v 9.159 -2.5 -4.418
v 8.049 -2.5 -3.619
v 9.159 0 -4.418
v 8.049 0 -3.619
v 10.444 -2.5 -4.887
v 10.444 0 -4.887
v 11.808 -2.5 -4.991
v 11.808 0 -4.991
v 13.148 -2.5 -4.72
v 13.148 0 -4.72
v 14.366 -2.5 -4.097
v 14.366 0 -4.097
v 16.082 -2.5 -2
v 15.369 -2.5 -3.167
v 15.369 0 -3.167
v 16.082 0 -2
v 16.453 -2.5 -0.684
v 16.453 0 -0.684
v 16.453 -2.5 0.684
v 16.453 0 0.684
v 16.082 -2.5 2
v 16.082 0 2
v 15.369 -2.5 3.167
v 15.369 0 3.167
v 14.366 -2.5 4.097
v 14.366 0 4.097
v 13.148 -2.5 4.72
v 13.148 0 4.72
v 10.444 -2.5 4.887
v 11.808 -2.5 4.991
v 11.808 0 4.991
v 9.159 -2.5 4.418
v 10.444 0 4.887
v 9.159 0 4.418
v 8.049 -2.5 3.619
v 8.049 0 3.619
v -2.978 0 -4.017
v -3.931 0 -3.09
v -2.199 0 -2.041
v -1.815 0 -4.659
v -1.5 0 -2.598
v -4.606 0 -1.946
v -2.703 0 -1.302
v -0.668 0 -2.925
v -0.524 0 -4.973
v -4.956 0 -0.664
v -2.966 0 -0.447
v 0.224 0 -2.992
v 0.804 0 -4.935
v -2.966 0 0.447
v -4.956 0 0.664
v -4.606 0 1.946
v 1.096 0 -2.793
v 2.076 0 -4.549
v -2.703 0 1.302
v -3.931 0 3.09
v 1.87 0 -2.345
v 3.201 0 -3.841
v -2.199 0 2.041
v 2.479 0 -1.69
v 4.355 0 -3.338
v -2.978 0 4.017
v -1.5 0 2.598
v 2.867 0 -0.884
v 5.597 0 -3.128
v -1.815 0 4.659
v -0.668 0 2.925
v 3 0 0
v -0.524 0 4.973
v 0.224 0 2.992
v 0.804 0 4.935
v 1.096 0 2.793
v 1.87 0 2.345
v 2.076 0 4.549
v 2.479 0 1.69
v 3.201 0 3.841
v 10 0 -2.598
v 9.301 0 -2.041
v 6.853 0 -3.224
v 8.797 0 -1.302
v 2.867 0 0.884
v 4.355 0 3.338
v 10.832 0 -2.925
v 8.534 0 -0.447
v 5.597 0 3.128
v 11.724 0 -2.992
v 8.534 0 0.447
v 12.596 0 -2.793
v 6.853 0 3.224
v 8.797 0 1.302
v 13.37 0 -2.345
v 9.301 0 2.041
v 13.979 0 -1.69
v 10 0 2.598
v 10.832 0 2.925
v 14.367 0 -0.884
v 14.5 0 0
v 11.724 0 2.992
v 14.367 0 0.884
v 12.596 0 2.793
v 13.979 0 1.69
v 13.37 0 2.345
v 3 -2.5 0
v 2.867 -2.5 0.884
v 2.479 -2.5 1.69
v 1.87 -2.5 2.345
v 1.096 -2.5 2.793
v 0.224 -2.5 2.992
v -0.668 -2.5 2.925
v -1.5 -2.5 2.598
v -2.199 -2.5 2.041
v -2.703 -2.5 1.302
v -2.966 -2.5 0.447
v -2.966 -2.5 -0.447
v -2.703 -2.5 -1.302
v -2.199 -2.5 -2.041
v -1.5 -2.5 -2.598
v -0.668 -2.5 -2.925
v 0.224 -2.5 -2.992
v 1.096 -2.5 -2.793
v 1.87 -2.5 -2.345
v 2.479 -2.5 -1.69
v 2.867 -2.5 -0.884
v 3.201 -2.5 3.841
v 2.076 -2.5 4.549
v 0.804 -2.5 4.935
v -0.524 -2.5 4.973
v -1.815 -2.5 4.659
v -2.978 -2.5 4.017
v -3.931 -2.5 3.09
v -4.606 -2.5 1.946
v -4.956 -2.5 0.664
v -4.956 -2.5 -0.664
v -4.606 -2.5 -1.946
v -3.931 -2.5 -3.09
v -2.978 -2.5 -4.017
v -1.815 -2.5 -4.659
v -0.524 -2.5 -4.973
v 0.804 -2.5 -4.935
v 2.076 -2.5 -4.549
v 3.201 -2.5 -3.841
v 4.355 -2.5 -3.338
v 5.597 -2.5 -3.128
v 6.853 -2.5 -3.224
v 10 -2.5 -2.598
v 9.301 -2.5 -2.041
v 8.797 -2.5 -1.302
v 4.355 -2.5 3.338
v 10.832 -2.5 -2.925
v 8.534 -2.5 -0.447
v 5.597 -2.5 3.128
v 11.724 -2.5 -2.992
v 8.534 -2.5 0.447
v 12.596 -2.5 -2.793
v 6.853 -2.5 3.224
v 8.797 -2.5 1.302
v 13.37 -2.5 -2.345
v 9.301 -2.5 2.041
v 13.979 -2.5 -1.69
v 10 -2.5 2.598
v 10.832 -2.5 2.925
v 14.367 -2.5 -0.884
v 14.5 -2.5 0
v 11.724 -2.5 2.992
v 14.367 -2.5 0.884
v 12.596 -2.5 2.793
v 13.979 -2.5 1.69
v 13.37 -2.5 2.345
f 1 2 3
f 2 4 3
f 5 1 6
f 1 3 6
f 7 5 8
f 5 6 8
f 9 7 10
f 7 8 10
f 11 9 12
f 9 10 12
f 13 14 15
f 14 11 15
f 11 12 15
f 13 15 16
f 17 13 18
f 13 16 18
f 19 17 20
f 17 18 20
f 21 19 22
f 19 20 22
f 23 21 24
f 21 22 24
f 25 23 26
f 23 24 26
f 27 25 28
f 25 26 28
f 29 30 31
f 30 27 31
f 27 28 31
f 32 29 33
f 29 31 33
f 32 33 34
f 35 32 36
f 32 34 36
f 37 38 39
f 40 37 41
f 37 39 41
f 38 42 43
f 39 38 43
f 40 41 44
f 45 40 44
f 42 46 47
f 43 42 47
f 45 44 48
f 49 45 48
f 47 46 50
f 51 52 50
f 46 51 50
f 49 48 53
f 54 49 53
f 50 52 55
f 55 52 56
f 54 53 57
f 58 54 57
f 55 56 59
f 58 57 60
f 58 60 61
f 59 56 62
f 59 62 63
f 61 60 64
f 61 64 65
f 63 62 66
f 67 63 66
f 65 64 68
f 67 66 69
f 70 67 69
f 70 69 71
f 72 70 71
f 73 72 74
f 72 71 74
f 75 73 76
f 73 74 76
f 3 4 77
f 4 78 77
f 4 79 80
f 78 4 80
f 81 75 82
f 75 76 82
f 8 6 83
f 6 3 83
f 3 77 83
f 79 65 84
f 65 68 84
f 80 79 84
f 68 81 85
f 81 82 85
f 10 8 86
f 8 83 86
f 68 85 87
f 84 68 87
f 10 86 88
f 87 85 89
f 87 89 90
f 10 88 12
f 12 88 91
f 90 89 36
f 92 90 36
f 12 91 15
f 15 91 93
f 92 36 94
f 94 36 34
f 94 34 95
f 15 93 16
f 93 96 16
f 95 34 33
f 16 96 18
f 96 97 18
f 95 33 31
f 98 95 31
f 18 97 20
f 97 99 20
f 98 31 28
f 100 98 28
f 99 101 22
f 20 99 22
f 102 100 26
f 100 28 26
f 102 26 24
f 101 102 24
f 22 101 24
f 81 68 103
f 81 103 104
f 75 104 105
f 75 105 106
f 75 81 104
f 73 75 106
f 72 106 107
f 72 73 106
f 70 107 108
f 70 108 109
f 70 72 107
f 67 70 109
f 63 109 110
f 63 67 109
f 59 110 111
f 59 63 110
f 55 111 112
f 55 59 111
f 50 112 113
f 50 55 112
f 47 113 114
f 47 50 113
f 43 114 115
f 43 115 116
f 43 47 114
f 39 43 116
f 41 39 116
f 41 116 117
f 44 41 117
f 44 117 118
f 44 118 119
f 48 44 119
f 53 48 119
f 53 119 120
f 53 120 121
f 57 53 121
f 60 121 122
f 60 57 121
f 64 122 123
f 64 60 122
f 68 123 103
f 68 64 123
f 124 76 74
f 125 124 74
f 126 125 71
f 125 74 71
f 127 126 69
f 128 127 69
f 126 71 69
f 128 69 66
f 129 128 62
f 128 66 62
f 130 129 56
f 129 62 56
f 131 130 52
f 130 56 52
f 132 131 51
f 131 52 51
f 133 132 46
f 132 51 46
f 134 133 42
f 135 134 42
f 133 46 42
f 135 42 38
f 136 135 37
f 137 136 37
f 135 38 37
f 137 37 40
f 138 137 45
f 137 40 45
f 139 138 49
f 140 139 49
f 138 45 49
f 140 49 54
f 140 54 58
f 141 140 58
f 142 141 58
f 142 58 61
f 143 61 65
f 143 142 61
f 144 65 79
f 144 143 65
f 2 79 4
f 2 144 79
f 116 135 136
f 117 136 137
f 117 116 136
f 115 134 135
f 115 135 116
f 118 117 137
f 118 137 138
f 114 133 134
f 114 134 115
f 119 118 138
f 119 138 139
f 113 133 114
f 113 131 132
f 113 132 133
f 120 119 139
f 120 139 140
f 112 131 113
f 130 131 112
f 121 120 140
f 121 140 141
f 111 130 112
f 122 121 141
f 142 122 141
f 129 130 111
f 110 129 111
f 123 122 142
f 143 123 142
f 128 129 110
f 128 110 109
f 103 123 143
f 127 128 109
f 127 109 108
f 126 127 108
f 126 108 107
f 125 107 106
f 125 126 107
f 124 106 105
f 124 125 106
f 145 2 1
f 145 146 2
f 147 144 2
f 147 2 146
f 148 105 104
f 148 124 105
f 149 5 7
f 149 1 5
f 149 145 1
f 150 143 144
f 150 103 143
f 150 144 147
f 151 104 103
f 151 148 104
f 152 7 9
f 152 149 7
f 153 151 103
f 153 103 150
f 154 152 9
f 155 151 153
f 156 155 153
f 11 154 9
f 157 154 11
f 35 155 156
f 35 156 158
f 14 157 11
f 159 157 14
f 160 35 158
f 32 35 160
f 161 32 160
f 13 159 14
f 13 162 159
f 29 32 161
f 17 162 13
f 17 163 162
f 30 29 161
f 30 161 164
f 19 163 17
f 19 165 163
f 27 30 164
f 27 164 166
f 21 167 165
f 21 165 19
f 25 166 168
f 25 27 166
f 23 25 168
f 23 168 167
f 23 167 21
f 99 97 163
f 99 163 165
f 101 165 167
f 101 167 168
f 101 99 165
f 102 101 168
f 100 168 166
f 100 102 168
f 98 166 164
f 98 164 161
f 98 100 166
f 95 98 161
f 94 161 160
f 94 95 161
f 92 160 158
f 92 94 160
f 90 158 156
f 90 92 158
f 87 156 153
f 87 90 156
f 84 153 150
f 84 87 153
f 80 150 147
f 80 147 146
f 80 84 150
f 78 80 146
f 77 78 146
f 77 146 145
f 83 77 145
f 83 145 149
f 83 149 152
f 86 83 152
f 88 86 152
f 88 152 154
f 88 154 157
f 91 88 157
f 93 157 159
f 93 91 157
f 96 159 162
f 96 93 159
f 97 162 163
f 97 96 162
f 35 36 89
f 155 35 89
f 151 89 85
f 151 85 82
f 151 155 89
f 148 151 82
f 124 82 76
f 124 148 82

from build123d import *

# Parameters (mm, degrees)
F0_R     = 5
F0_R_2   = 3
F1_DEPTH = 2.5
F2_R     = 5
F2_R_2   = 3
F3_DEPTH = 2.5
F5_DEPTH = 2.5


with BuildPart() as f1:
    # F0 (on Front) → F1 (new body)
    with BuildSketch(Plane.XZ):
        Circle(F0_R)
        Circle(F0_R_2, mode=Mode.SUBTRACT)
    extrude(amount=F1_DEPTH)



with BuildPart() as f3:
    # F2 (on Front) → F3 (new body)
    with BuildSketch(Plane.XZ):
        with Locations((11.5, 0)):
            Circle(F2_R)
        with Locations((11.5, 0)):
            Circle(F2_R_2, mode=Mode.SUBTRACT)
    extrude(amount=F3_DEPTH)


with BuildPart() as f1_1:
    add(f1.part)

    add(f3.part)  # F5 merges F3
    # F4 (on face) → F5 (join)
    with BuildSketch(Plane.XZ.offset(2.5)):
        with BuildLine():
            ThreePointArc((8.4708627887, 3.8414155761), (5.8357068684, 3.1228084753), (3.2005509482, 3.8414155761))
            ThreePointArc((3.2005509482, 3.8414155761), (5, 0), (3.2005509482, -3.8414155761))
            ThreePointArc((3.2005509482, -3.8414155761), (5.8357068684, -3.1228084753), (8.4708627887, -3.8414155761))
            ThreePointArc((8.4708627887, -3.8414155761), (6.6079507491, 0), (8.4708627887, 3.8414155761))
        make_face()
    extrude(amount=-F5_DEPTH)


solid = f1_1.part
